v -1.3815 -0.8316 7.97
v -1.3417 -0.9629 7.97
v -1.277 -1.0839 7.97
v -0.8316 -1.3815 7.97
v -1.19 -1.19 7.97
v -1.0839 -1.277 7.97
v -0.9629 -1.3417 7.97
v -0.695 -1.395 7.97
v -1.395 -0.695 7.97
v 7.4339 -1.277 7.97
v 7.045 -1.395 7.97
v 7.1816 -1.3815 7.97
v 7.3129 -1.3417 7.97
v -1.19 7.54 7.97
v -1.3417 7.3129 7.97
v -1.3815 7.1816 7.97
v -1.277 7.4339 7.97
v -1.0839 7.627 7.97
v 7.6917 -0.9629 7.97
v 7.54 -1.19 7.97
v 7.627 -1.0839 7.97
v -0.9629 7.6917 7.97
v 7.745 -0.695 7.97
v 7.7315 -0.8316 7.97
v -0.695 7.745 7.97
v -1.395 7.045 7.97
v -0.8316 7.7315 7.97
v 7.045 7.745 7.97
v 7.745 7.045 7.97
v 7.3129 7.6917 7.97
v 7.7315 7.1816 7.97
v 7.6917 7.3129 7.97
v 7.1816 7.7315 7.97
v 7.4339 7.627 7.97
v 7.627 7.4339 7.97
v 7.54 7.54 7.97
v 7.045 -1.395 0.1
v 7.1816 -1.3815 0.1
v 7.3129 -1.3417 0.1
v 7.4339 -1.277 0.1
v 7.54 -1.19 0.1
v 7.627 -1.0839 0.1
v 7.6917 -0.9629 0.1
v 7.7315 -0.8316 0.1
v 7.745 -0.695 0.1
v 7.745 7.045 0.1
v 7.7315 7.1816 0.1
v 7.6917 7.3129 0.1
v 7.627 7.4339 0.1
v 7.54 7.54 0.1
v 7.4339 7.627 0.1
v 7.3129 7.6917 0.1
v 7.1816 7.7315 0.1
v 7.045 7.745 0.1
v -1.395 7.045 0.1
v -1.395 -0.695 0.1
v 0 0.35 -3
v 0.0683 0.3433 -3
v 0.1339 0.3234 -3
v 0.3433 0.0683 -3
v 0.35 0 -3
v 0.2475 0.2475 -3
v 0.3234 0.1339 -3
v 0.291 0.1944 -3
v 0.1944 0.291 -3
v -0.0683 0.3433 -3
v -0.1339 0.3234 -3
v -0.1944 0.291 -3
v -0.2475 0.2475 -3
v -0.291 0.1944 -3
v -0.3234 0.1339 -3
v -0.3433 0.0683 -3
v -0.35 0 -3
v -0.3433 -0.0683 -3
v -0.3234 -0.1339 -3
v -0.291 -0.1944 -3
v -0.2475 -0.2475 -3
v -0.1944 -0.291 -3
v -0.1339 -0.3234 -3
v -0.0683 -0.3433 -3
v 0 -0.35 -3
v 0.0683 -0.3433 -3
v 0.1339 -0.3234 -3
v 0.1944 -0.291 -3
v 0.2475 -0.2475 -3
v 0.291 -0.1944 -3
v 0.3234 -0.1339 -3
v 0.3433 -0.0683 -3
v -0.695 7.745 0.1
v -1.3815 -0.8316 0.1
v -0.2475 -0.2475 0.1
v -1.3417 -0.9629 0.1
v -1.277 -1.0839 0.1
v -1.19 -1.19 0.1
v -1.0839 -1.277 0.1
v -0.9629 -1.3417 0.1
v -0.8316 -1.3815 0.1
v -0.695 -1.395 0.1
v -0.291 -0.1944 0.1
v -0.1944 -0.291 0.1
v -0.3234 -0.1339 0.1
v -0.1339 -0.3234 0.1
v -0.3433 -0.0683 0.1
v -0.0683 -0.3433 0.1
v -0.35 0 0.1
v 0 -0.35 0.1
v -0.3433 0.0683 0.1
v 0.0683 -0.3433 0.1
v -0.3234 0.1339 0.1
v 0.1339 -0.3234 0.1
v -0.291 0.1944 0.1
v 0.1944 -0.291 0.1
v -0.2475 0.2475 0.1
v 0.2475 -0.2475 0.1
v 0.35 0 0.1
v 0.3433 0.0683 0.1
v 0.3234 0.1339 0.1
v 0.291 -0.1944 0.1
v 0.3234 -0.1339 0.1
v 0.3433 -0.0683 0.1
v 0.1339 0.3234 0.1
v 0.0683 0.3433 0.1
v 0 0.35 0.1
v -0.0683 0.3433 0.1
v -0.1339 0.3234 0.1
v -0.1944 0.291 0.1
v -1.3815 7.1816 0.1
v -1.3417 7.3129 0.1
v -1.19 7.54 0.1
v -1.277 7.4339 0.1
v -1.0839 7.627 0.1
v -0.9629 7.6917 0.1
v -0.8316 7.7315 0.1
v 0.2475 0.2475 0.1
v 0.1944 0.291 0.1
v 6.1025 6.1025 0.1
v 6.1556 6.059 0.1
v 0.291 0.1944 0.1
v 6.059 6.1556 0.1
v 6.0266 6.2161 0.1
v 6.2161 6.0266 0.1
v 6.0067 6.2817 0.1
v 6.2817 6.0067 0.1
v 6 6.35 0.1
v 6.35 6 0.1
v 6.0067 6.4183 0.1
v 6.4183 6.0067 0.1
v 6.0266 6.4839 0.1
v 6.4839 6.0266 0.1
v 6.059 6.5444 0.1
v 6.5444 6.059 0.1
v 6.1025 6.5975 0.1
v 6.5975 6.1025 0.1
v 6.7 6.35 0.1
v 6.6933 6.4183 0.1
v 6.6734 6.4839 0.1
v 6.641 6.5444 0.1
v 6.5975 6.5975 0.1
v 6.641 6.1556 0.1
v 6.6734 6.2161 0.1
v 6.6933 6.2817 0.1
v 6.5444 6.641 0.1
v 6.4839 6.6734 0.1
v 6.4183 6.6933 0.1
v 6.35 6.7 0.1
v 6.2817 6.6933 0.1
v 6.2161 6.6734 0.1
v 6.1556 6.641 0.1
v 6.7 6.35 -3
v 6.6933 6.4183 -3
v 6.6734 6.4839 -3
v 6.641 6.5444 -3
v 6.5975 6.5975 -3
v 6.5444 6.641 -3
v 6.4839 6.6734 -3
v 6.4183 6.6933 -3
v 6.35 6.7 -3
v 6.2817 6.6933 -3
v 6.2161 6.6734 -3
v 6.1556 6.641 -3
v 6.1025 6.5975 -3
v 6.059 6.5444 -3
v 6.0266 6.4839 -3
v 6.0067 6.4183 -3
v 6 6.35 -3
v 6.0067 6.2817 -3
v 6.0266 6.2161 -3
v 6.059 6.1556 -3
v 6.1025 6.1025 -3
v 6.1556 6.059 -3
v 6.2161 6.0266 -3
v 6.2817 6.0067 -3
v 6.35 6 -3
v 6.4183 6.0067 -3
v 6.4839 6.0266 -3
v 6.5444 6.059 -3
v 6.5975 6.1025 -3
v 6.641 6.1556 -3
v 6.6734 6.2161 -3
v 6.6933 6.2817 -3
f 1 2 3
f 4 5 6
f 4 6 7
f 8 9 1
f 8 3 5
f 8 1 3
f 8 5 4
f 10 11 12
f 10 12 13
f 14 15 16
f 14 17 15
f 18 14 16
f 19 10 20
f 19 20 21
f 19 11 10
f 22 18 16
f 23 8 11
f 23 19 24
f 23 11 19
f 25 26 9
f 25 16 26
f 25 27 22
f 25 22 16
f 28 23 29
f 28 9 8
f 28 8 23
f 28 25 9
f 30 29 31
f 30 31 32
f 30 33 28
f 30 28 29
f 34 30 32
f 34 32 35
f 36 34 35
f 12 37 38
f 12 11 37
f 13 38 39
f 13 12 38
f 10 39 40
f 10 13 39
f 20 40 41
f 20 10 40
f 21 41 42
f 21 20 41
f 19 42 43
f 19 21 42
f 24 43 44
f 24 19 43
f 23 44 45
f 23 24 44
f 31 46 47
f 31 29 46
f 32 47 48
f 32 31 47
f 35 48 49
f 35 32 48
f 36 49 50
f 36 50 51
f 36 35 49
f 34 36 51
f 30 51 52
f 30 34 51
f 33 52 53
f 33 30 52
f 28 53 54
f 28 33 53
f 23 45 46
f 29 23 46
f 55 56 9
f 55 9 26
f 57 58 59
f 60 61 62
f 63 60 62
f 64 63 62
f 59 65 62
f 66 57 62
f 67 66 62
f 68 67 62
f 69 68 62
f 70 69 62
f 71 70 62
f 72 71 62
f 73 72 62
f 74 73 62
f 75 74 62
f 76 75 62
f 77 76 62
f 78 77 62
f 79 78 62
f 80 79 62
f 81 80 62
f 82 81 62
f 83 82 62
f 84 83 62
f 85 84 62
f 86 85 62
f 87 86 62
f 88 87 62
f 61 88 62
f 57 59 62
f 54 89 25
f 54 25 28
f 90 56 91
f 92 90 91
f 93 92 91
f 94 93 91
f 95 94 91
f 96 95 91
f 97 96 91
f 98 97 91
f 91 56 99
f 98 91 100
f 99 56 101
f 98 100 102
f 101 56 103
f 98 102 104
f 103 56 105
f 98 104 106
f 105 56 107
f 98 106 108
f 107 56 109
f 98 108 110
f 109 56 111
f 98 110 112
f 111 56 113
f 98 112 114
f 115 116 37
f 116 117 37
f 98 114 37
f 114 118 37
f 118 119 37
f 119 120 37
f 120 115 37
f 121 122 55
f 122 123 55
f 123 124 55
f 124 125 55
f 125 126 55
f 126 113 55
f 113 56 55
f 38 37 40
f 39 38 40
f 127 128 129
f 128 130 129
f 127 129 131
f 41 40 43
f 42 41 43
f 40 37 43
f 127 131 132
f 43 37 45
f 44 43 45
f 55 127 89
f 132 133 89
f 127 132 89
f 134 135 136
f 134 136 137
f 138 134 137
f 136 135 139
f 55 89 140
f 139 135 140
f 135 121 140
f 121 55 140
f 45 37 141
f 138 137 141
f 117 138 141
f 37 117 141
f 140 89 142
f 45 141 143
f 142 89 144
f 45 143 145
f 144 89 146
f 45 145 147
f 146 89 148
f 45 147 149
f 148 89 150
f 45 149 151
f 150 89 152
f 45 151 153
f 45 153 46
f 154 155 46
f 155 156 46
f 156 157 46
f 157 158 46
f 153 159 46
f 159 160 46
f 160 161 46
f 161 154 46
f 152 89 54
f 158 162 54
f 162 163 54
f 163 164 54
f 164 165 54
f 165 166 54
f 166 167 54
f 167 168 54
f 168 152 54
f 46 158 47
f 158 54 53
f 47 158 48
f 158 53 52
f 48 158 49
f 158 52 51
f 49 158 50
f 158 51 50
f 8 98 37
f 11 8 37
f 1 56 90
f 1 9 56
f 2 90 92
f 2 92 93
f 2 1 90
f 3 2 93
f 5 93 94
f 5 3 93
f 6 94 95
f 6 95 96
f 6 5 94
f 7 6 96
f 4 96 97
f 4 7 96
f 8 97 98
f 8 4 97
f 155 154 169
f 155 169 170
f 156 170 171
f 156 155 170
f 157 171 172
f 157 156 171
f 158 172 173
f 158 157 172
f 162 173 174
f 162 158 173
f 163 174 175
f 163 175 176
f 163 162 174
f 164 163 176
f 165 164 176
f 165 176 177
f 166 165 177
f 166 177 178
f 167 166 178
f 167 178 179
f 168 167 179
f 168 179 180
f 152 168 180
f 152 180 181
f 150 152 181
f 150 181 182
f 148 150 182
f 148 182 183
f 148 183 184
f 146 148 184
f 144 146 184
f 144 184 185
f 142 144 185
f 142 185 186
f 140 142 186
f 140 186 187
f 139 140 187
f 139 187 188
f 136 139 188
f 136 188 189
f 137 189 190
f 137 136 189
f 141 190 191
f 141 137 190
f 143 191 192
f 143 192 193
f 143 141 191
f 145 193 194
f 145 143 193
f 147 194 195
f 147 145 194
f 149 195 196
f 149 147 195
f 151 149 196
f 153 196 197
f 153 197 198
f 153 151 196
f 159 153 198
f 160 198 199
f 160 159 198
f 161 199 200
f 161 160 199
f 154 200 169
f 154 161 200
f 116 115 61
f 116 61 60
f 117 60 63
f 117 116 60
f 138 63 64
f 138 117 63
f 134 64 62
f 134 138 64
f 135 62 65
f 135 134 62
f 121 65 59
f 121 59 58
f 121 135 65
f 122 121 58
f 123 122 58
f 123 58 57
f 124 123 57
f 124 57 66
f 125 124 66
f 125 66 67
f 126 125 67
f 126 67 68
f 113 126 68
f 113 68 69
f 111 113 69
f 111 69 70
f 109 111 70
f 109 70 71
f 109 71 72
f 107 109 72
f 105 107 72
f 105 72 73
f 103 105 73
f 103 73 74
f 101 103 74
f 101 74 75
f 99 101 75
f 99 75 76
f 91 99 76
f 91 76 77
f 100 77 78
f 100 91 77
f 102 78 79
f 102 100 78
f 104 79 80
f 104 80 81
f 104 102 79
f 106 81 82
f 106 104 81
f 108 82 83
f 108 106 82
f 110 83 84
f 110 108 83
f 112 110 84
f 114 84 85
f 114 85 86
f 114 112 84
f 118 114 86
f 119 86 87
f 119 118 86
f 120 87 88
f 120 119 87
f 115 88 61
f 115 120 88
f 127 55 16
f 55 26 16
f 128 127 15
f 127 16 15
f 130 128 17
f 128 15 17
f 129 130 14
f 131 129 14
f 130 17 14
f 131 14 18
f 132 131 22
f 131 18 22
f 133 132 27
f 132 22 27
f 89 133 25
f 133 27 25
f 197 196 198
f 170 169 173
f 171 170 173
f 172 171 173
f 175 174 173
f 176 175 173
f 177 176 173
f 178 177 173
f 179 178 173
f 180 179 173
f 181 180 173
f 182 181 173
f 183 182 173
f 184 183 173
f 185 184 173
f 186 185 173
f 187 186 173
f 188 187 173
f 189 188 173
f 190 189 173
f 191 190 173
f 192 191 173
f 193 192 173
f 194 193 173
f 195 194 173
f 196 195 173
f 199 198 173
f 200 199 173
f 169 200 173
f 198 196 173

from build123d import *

# Parameters (mm, degrees)
SKETCH_W     = 9.14
SKETCH_H     = 9.14
PAD_DEPTH    = 7.87
FILLET_R     = 0.7
SKETCH001_R  = 0.35
PAD001_DEPTH = 3.5


with BuildPart() as fillet_body:
    # Sketch → Pad (new body)
    with BuildSketch(Plane.XY.offset(0.1)):
        with Locations((3.175, 3.175)):
            Rectangle(SKETCH_W, SKETCH_H)
    extrude(amount=PAD_DEPTH)

    # Fillet
    fillet_edges = [fillet_body.edges().sort_by_distance(p)[0] for p in [
        (7.745, -1.395, 4.035),
        (7.745, 7.745, 4.035),
        (-1.395, -1.395, 4.035),
        (-1.395, 7.745, 4.035),
    ]]
    fillet(fillet_edges, radius=FILLET_R)


with BuildPart() as pad001_mp_cp:
    # Sketch001 → Pad001 (new body)
    with BuildSketch(Plane.XY.offset(0.5)):
        Circle(SKETCH001_R)
        with Locations((6.35, 6.35)):
            Circle(SKETCH001_R)
    extrude(amount=-PAD001_DEPTH)

    # Pad001_mp_cp: union Fillet body
    add(fillet_body.part)


solid = pad001_mp_cp.part
